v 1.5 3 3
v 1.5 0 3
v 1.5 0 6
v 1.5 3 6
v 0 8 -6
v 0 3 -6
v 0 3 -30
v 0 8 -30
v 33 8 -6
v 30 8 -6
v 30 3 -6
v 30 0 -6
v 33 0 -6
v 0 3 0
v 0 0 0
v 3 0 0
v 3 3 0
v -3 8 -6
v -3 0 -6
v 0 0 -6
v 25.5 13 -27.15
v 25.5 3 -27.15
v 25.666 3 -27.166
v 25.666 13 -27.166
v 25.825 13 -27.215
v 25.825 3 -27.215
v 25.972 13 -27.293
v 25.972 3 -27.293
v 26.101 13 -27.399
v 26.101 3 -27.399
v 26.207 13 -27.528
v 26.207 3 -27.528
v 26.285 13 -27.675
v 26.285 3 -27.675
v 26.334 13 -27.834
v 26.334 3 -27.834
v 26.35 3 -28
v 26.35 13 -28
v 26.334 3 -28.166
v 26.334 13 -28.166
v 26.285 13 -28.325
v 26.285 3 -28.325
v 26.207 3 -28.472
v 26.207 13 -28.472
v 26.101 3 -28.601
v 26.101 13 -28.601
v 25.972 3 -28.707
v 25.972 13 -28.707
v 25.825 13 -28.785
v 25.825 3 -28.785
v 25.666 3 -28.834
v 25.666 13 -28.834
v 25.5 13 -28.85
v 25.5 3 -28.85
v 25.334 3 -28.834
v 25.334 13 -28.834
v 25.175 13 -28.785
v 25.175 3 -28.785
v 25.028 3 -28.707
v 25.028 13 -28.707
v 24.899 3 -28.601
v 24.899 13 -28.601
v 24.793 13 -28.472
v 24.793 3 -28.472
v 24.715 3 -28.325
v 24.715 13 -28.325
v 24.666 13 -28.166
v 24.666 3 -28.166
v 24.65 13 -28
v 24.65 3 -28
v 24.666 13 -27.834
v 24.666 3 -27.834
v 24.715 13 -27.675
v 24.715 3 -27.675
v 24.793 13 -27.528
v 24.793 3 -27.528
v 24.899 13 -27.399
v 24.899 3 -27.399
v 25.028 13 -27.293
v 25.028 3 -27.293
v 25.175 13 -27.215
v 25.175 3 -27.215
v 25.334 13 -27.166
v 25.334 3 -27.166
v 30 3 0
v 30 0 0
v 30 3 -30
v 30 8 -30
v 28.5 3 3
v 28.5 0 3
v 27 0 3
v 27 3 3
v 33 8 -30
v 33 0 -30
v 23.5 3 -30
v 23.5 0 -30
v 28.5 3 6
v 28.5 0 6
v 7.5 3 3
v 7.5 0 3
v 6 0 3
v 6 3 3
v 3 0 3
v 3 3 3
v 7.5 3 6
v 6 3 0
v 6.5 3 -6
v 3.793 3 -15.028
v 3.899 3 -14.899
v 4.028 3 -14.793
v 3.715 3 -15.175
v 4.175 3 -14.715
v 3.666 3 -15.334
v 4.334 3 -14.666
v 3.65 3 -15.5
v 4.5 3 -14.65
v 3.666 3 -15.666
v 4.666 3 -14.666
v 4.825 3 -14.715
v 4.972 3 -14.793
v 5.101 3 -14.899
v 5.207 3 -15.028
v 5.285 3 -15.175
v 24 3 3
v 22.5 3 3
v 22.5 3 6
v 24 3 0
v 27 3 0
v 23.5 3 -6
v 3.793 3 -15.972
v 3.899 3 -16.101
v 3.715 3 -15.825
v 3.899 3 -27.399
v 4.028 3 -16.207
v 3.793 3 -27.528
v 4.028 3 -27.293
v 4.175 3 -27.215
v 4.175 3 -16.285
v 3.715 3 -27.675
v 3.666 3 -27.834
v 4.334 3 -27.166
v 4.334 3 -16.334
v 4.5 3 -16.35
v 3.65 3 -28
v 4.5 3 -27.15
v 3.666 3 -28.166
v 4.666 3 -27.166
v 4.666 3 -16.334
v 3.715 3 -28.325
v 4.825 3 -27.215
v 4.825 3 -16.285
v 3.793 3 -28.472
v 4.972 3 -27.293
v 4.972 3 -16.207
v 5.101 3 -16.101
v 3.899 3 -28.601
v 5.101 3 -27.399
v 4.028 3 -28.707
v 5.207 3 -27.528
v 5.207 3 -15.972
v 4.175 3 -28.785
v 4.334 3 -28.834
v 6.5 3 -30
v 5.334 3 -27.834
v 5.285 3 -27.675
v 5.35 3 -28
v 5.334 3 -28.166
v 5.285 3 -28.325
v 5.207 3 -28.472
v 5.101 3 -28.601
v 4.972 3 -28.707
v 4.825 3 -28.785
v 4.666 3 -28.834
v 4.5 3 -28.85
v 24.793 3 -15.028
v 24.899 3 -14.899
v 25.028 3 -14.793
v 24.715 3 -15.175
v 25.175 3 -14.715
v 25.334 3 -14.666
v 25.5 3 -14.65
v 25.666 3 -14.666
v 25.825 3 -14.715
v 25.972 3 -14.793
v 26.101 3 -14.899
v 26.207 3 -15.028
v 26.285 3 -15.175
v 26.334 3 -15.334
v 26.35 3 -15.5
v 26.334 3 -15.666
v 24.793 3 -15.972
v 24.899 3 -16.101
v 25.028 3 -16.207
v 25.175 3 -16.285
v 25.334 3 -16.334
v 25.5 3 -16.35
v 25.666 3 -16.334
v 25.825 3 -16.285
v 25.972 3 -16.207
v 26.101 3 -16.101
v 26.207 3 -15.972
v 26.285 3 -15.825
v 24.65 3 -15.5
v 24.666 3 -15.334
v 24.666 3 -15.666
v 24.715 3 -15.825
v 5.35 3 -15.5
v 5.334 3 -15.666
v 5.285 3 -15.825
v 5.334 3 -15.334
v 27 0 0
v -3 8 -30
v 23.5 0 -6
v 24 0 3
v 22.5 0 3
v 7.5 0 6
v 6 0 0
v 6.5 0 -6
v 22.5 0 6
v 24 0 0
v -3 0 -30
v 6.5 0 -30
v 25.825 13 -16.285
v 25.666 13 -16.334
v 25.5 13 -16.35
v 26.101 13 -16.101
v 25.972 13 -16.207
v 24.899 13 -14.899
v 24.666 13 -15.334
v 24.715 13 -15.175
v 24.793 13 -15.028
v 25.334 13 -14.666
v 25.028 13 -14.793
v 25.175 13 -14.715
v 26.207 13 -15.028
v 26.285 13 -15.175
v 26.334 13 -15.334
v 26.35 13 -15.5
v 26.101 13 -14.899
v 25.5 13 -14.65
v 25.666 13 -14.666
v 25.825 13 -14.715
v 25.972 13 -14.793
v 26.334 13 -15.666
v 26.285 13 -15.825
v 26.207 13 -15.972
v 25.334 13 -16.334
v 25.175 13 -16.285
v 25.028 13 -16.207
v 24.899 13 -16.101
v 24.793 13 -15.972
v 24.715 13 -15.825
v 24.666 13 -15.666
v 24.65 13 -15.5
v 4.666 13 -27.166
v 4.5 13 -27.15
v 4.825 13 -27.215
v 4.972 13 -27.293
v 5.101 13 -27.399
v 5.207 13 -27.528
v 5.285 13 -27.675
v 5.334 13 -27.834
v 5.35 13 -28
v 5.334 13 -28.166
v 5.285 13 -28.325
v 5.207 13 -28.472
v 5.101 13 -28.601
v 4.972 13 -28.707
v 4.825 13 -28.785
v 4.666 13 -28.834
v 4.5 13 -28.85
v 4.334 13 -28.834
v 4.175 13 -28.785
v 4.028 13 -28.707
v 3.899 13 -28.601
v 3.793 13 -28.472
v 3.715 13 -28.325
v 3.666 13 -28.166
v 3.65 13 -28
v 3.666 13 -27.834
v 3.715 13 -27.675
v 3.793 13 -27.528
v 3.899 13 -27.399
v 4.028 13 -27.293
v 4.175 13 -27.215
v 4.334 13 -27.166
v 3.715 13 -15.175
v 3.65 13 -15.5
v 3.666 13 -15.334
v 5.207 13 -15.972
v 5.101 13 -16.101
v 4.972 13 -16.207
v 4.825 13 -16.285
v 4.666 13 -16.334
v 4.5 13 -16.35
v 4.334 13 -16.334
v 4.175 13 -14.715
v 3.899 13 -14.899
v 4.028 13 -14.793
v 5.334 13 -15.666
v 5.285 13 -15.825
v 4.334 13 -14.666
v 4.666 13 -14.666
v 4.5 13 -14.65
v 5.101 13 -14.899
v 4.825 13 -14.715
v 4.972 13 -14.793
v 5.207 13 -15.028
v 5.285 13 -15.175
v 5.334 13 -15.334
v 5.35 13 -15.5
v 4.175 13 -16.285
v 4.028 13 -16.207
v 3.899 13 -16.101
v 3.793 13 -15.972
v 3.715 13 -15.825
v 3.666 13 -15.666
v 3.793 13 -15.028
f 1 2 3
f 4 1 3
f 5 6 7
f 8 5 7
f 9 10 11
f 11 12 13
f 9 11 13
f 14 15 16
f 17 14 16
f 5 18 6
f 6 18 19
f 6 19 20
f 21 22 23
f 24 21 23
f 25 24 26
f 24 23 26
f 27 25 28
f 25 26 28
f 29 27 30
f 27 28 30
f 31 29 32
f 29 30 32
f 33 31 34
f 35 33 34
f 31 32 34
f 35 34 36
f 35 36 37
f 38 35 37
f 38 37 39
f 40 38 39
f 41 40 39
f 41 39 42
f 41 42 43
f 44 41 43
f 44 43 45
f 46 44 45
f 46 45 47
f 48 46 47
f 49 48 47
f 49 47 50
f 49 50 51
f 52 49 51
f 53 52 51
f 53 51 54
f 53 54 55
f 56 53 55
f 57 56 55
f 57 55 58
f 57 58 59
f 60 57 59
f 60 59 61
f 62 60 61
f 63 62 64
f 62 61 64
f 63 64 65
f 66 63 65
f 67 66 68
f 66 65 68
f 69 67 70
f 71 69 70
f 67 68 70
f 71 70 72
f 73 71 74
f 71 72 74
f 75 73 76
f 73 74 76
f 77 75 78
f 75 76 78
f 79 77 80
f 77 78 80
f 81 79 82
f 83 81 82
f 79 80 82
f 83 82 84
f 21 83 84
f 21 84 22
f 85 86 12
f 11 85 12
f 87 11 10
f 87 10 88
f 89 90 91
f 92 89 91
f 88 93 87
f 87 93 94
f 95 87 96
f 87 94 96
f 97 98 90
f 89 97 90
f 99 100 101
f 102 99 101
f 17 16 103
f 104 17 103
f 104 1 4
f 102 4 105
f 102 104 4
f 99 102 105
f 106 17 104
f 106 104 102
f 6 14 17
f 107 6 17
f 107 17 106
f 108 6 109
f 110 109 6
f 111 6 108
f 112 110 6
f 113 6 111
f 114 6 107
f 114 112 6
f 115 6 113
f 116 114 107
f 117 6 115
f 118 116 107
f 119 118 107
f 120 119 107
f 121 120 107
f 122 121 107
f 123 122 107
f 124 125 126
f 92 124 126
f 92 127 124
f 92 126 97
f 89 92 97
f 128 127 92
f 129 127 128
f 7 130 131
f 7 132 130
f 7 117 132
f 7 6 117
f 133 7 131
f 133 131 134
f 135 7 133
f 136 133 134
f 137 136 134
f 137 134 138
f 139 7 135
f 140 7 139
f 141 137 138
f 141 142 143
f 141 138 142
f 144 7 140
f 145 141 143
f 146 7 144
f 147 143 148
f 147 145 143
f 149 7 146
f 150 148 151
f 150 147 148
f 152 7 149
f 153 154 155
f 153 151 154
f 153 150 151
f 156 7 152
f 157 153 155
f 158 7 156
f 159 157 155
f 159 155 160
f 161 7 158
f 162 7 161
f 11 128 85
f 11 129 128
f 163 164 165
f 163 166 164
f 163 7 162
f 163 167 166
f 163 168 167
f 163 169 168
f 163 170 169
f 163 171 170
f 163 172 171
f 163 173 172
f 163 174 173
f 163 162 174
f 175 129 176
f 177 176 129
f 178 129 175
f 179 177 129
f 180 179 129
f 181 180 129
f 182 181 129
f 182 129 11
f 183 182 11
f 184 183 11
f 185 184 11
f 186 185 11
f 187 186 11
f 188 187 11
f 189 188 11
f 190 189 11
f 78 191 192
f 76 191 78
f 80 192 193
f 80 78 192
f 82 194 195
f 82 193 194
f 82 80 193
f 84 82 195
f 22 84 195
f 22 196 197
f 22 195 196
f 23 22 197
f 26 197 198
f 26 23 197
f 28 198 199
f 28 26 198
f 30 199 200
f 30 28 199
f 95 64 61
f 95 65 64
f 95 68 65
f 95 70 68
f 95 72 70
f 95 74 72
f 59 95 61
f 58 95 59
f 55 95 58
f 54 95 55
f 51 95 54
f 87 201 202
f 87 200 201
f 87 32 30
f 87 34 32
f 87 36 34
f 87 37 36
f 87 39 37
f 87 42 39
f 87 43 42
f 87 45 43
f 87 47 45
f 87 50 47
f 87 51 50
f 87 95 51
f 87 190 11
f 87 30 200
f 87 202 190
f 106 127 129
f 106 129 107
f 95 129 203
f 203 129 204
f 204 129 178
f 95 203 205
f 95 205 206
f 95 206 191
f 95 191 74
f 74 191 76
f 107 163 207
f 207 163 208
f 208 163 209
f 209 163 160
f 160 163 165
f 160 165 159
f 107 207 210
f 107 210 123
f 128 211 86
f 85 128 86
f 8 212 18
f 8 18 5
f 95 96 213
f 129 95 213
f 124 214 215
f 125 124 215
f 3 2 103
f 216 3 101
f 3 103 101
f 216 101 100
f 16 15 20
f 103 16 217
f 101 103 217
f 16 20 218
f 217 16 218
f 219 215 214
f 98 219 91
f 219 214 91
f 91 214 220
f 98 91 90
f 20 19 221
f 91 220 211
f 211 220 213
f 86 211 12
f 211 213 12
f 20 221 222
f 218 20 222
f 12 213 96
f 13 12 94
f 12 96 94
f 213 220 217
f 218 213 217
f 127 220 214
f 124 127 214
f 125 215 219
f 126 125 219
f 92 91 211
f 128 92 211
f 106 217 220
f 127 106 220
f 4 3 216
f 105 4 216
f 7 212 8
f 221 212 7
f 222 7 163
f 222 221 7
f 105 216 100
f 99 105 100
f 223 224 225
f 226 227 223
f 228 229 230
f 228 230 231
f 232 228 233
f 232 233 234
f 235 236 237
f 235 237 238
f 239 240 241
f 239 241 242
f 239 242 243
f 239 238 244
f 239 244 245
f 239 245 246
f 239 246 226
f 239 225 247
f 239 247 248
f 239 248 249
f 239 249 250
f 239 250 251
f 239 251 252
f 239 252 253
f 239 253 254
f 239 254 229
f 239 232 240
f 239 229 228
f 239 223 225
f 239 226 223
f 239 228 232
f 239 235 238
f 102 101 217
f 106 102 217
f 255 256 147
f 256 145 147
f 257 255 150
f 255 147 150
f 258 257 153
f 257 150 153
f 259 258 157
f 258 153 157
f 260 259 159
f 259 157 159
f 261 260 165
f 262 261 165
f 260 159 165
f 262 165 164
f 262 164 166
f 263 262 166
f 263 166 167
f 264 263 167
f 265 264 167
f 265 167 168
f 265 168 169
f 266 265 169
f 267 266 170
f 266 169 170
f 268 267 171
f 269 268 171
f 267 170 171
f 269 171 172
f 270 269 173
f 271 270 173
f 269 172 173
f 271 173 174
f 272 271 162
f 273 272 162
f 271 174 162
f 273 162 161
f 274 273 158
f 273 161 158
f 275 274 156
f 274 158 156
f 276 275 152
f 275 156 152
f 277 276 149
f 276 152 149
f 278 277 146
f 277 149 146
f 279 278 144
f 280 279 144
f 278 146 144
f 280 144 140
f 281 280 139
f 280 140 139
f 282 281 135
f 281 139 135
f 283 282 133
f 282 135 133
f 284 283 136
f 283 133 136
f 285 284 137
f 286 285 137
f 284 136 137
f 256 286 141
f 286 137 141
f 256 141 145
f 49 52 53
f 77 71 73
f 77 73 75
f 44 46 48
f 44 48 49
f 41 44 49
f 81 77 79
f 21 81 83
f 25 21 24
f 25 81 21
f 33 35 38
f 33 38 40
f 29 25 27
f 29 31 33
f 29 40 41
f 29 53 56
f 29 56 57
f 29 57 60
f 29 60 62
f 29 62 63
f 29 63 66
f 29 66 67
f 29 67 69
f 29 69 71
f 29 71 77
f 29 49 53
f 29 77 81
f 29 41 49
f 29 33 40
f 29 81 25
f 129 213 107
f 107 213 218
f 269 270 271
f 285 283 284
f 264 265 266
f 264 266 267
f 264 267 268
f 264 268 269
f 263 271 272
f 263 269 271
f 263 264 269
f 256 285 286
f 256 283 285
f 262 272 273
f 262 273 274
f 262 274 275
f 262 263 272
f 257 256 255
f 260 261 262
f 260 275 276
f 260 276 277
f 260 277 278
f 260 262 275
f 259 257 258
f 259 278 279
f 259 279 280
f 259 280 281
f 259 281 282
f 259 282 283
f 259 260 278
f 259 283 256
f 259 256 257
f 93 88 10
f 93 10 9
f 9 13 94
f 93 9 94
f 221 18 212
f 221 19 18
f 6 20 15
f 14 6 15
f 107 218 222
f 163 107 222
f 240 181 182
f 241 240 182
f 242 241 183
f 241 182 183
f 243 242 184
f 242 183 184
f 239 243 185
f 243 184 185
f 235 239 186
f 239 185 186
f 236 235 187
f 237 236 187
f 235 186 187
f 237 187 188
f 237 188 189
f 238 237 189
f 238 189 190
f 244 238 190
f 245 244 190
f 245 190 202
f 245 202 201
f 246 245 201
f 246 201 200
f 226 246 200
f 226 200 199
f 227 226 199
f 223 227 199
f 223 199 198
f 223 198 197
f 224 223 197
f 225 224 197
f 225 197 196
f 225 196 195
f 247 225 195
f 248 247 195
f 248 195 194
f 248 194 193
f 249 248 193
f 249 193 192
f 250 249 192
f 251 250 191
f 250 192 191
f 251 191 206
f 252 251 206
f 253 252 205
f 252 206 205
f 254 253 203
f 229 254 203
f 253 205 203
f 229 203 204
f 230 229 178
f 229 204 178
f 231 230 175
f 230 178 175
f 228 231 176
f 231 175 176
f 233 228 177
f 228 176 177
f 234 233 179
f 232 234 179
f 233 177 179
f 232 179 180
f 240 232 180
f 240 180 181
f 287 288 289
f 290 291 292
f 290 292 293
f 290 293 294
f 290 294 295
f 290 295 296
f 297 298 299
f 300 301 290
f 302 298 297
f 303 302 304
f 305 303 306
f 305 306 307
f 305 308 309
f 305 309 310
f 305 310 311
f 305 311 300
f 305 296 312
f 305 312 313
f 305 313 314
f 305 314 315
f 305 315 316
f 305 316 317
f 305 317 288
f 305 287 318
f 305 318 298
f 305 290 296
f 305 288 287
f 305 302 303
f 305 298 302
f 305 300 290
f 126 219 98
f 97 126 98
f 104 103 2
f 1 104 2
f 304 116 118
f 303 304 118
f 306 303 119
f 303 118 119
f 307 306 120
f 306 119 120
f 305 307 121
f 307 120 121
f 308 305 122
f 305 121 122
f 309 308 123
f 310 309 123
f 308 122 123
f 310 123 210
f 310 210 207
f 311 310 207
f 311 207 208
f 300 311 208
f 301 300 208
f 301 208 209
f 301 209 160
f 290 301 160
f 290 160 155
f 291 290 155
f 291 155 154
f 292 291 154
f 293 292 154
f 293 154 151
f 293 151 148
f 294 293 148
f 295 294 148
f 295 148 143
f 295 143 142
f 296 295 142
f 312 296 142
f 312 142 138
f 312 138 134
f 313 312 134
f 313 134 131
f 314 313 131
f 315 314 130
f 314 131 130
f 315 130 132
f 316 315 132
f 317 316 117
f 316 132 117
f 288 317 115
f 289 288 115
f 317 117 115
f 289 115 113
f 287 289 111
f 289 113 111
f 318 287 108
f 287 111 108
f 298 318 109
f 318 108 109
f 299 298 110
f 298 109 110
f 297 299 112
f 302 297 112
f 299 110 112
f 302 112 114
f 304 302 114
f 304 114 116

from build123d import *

# Parameters (mm, degrees)
BOSS_EXTRUDE1_DEPTH = 3
SKETCH2_R           = 0.85
SKETCH2_W           = 3
SKETCH2_H           = 24
BOSS_EXTRUDE2_DEPTH = 5
SKETCH3_R           = 0.85
BOSS_EXTRUDE3_DEPTH = 5


with BuildPart() as part:
    # Sketch1 → Boss-Extrude1 (new body)
    with BuildSketch(Plane(origin=(0, 0, 0), x_dir=(1, 0, 0), z_dir=(0, 1, 0))):
        Polygon((0, 0), (3, 0), (3, -3), (1.5, -3), (1.5, -6), (7.5, -6), (7.5, -3), (6, -3), (6, 0), (24, 0), (24, -3), (22.5, -3), (22.5, -6), (28.5, -6), (28.5, -3), (27, -3), (27, 0), (30, 0), (30, 6), (33, 6), (33, 30), (23.5, 30), (23.5, 6), (6.5, 6), (6.5, 30), (-3, 30), (-3, 6), (0, 6), align=None)
    extrude(amount=BOSS_EXTRUDE1_DEPTH)

    # Sketch2 → Boss-Extrude2 (add)
    with BuildSketch(Plane(origin=(0, 3, 0), x_dir=(1, 0, 0), z_dir=(0, 1, 0))):
        with Locations(Location((4.5, 28, 0), (0, 0, 270))):
            Circle(SKETCH2_R)
        with Locations(Location((25.5, 28, 0), (0, 0, 270))):
            Circle(SKETCH2_R)
        with Locations(Location((25.5, 15.5, 0), (0, 0, 270))):
            Circle(SKETCH2_R)
        with Locations(Location((4.5, 15.5, 0), (0, 0, 270))):
            Circle(SKETCH2_R)
        with Locations((-1.5, 18)):
            Rectangle(SKETCH2_W, SKETCH2_H)
        with Locations((31.5, 18)):
            Rectangle(SKETCH2_W, SKETCH2_H)
    extrude(amount=BOSS_EXTRUDE2_DEPTH)

    # Sketch3 → Boss-Extrude3 (add)
    with BuildSketch(Plane(origin=(0, 8, 0), x_dir=(1, 0, 0), z_dir=(0, 1, 0))):
        with Locations(Location((4.5, 28, 0), (0, 0, 270))):
            Circle(SKETCH3_R)
        with Locations(Location((25.5, 28, 0), (0, 0, 270))):
            Circle(SKETCH3_R)
        with Locations(Location((25.5, 15.5, 0), (0, 0, 270))):
            Circle(SKETCH3_R)
        with Locations(Location((4.5, 15.5, 0), (0, 0, 270))):
            Circle(SKETCH3_R)
    extrude(amount=BOSS_EXTRUDE3_DEPTH)


solid = part.part
